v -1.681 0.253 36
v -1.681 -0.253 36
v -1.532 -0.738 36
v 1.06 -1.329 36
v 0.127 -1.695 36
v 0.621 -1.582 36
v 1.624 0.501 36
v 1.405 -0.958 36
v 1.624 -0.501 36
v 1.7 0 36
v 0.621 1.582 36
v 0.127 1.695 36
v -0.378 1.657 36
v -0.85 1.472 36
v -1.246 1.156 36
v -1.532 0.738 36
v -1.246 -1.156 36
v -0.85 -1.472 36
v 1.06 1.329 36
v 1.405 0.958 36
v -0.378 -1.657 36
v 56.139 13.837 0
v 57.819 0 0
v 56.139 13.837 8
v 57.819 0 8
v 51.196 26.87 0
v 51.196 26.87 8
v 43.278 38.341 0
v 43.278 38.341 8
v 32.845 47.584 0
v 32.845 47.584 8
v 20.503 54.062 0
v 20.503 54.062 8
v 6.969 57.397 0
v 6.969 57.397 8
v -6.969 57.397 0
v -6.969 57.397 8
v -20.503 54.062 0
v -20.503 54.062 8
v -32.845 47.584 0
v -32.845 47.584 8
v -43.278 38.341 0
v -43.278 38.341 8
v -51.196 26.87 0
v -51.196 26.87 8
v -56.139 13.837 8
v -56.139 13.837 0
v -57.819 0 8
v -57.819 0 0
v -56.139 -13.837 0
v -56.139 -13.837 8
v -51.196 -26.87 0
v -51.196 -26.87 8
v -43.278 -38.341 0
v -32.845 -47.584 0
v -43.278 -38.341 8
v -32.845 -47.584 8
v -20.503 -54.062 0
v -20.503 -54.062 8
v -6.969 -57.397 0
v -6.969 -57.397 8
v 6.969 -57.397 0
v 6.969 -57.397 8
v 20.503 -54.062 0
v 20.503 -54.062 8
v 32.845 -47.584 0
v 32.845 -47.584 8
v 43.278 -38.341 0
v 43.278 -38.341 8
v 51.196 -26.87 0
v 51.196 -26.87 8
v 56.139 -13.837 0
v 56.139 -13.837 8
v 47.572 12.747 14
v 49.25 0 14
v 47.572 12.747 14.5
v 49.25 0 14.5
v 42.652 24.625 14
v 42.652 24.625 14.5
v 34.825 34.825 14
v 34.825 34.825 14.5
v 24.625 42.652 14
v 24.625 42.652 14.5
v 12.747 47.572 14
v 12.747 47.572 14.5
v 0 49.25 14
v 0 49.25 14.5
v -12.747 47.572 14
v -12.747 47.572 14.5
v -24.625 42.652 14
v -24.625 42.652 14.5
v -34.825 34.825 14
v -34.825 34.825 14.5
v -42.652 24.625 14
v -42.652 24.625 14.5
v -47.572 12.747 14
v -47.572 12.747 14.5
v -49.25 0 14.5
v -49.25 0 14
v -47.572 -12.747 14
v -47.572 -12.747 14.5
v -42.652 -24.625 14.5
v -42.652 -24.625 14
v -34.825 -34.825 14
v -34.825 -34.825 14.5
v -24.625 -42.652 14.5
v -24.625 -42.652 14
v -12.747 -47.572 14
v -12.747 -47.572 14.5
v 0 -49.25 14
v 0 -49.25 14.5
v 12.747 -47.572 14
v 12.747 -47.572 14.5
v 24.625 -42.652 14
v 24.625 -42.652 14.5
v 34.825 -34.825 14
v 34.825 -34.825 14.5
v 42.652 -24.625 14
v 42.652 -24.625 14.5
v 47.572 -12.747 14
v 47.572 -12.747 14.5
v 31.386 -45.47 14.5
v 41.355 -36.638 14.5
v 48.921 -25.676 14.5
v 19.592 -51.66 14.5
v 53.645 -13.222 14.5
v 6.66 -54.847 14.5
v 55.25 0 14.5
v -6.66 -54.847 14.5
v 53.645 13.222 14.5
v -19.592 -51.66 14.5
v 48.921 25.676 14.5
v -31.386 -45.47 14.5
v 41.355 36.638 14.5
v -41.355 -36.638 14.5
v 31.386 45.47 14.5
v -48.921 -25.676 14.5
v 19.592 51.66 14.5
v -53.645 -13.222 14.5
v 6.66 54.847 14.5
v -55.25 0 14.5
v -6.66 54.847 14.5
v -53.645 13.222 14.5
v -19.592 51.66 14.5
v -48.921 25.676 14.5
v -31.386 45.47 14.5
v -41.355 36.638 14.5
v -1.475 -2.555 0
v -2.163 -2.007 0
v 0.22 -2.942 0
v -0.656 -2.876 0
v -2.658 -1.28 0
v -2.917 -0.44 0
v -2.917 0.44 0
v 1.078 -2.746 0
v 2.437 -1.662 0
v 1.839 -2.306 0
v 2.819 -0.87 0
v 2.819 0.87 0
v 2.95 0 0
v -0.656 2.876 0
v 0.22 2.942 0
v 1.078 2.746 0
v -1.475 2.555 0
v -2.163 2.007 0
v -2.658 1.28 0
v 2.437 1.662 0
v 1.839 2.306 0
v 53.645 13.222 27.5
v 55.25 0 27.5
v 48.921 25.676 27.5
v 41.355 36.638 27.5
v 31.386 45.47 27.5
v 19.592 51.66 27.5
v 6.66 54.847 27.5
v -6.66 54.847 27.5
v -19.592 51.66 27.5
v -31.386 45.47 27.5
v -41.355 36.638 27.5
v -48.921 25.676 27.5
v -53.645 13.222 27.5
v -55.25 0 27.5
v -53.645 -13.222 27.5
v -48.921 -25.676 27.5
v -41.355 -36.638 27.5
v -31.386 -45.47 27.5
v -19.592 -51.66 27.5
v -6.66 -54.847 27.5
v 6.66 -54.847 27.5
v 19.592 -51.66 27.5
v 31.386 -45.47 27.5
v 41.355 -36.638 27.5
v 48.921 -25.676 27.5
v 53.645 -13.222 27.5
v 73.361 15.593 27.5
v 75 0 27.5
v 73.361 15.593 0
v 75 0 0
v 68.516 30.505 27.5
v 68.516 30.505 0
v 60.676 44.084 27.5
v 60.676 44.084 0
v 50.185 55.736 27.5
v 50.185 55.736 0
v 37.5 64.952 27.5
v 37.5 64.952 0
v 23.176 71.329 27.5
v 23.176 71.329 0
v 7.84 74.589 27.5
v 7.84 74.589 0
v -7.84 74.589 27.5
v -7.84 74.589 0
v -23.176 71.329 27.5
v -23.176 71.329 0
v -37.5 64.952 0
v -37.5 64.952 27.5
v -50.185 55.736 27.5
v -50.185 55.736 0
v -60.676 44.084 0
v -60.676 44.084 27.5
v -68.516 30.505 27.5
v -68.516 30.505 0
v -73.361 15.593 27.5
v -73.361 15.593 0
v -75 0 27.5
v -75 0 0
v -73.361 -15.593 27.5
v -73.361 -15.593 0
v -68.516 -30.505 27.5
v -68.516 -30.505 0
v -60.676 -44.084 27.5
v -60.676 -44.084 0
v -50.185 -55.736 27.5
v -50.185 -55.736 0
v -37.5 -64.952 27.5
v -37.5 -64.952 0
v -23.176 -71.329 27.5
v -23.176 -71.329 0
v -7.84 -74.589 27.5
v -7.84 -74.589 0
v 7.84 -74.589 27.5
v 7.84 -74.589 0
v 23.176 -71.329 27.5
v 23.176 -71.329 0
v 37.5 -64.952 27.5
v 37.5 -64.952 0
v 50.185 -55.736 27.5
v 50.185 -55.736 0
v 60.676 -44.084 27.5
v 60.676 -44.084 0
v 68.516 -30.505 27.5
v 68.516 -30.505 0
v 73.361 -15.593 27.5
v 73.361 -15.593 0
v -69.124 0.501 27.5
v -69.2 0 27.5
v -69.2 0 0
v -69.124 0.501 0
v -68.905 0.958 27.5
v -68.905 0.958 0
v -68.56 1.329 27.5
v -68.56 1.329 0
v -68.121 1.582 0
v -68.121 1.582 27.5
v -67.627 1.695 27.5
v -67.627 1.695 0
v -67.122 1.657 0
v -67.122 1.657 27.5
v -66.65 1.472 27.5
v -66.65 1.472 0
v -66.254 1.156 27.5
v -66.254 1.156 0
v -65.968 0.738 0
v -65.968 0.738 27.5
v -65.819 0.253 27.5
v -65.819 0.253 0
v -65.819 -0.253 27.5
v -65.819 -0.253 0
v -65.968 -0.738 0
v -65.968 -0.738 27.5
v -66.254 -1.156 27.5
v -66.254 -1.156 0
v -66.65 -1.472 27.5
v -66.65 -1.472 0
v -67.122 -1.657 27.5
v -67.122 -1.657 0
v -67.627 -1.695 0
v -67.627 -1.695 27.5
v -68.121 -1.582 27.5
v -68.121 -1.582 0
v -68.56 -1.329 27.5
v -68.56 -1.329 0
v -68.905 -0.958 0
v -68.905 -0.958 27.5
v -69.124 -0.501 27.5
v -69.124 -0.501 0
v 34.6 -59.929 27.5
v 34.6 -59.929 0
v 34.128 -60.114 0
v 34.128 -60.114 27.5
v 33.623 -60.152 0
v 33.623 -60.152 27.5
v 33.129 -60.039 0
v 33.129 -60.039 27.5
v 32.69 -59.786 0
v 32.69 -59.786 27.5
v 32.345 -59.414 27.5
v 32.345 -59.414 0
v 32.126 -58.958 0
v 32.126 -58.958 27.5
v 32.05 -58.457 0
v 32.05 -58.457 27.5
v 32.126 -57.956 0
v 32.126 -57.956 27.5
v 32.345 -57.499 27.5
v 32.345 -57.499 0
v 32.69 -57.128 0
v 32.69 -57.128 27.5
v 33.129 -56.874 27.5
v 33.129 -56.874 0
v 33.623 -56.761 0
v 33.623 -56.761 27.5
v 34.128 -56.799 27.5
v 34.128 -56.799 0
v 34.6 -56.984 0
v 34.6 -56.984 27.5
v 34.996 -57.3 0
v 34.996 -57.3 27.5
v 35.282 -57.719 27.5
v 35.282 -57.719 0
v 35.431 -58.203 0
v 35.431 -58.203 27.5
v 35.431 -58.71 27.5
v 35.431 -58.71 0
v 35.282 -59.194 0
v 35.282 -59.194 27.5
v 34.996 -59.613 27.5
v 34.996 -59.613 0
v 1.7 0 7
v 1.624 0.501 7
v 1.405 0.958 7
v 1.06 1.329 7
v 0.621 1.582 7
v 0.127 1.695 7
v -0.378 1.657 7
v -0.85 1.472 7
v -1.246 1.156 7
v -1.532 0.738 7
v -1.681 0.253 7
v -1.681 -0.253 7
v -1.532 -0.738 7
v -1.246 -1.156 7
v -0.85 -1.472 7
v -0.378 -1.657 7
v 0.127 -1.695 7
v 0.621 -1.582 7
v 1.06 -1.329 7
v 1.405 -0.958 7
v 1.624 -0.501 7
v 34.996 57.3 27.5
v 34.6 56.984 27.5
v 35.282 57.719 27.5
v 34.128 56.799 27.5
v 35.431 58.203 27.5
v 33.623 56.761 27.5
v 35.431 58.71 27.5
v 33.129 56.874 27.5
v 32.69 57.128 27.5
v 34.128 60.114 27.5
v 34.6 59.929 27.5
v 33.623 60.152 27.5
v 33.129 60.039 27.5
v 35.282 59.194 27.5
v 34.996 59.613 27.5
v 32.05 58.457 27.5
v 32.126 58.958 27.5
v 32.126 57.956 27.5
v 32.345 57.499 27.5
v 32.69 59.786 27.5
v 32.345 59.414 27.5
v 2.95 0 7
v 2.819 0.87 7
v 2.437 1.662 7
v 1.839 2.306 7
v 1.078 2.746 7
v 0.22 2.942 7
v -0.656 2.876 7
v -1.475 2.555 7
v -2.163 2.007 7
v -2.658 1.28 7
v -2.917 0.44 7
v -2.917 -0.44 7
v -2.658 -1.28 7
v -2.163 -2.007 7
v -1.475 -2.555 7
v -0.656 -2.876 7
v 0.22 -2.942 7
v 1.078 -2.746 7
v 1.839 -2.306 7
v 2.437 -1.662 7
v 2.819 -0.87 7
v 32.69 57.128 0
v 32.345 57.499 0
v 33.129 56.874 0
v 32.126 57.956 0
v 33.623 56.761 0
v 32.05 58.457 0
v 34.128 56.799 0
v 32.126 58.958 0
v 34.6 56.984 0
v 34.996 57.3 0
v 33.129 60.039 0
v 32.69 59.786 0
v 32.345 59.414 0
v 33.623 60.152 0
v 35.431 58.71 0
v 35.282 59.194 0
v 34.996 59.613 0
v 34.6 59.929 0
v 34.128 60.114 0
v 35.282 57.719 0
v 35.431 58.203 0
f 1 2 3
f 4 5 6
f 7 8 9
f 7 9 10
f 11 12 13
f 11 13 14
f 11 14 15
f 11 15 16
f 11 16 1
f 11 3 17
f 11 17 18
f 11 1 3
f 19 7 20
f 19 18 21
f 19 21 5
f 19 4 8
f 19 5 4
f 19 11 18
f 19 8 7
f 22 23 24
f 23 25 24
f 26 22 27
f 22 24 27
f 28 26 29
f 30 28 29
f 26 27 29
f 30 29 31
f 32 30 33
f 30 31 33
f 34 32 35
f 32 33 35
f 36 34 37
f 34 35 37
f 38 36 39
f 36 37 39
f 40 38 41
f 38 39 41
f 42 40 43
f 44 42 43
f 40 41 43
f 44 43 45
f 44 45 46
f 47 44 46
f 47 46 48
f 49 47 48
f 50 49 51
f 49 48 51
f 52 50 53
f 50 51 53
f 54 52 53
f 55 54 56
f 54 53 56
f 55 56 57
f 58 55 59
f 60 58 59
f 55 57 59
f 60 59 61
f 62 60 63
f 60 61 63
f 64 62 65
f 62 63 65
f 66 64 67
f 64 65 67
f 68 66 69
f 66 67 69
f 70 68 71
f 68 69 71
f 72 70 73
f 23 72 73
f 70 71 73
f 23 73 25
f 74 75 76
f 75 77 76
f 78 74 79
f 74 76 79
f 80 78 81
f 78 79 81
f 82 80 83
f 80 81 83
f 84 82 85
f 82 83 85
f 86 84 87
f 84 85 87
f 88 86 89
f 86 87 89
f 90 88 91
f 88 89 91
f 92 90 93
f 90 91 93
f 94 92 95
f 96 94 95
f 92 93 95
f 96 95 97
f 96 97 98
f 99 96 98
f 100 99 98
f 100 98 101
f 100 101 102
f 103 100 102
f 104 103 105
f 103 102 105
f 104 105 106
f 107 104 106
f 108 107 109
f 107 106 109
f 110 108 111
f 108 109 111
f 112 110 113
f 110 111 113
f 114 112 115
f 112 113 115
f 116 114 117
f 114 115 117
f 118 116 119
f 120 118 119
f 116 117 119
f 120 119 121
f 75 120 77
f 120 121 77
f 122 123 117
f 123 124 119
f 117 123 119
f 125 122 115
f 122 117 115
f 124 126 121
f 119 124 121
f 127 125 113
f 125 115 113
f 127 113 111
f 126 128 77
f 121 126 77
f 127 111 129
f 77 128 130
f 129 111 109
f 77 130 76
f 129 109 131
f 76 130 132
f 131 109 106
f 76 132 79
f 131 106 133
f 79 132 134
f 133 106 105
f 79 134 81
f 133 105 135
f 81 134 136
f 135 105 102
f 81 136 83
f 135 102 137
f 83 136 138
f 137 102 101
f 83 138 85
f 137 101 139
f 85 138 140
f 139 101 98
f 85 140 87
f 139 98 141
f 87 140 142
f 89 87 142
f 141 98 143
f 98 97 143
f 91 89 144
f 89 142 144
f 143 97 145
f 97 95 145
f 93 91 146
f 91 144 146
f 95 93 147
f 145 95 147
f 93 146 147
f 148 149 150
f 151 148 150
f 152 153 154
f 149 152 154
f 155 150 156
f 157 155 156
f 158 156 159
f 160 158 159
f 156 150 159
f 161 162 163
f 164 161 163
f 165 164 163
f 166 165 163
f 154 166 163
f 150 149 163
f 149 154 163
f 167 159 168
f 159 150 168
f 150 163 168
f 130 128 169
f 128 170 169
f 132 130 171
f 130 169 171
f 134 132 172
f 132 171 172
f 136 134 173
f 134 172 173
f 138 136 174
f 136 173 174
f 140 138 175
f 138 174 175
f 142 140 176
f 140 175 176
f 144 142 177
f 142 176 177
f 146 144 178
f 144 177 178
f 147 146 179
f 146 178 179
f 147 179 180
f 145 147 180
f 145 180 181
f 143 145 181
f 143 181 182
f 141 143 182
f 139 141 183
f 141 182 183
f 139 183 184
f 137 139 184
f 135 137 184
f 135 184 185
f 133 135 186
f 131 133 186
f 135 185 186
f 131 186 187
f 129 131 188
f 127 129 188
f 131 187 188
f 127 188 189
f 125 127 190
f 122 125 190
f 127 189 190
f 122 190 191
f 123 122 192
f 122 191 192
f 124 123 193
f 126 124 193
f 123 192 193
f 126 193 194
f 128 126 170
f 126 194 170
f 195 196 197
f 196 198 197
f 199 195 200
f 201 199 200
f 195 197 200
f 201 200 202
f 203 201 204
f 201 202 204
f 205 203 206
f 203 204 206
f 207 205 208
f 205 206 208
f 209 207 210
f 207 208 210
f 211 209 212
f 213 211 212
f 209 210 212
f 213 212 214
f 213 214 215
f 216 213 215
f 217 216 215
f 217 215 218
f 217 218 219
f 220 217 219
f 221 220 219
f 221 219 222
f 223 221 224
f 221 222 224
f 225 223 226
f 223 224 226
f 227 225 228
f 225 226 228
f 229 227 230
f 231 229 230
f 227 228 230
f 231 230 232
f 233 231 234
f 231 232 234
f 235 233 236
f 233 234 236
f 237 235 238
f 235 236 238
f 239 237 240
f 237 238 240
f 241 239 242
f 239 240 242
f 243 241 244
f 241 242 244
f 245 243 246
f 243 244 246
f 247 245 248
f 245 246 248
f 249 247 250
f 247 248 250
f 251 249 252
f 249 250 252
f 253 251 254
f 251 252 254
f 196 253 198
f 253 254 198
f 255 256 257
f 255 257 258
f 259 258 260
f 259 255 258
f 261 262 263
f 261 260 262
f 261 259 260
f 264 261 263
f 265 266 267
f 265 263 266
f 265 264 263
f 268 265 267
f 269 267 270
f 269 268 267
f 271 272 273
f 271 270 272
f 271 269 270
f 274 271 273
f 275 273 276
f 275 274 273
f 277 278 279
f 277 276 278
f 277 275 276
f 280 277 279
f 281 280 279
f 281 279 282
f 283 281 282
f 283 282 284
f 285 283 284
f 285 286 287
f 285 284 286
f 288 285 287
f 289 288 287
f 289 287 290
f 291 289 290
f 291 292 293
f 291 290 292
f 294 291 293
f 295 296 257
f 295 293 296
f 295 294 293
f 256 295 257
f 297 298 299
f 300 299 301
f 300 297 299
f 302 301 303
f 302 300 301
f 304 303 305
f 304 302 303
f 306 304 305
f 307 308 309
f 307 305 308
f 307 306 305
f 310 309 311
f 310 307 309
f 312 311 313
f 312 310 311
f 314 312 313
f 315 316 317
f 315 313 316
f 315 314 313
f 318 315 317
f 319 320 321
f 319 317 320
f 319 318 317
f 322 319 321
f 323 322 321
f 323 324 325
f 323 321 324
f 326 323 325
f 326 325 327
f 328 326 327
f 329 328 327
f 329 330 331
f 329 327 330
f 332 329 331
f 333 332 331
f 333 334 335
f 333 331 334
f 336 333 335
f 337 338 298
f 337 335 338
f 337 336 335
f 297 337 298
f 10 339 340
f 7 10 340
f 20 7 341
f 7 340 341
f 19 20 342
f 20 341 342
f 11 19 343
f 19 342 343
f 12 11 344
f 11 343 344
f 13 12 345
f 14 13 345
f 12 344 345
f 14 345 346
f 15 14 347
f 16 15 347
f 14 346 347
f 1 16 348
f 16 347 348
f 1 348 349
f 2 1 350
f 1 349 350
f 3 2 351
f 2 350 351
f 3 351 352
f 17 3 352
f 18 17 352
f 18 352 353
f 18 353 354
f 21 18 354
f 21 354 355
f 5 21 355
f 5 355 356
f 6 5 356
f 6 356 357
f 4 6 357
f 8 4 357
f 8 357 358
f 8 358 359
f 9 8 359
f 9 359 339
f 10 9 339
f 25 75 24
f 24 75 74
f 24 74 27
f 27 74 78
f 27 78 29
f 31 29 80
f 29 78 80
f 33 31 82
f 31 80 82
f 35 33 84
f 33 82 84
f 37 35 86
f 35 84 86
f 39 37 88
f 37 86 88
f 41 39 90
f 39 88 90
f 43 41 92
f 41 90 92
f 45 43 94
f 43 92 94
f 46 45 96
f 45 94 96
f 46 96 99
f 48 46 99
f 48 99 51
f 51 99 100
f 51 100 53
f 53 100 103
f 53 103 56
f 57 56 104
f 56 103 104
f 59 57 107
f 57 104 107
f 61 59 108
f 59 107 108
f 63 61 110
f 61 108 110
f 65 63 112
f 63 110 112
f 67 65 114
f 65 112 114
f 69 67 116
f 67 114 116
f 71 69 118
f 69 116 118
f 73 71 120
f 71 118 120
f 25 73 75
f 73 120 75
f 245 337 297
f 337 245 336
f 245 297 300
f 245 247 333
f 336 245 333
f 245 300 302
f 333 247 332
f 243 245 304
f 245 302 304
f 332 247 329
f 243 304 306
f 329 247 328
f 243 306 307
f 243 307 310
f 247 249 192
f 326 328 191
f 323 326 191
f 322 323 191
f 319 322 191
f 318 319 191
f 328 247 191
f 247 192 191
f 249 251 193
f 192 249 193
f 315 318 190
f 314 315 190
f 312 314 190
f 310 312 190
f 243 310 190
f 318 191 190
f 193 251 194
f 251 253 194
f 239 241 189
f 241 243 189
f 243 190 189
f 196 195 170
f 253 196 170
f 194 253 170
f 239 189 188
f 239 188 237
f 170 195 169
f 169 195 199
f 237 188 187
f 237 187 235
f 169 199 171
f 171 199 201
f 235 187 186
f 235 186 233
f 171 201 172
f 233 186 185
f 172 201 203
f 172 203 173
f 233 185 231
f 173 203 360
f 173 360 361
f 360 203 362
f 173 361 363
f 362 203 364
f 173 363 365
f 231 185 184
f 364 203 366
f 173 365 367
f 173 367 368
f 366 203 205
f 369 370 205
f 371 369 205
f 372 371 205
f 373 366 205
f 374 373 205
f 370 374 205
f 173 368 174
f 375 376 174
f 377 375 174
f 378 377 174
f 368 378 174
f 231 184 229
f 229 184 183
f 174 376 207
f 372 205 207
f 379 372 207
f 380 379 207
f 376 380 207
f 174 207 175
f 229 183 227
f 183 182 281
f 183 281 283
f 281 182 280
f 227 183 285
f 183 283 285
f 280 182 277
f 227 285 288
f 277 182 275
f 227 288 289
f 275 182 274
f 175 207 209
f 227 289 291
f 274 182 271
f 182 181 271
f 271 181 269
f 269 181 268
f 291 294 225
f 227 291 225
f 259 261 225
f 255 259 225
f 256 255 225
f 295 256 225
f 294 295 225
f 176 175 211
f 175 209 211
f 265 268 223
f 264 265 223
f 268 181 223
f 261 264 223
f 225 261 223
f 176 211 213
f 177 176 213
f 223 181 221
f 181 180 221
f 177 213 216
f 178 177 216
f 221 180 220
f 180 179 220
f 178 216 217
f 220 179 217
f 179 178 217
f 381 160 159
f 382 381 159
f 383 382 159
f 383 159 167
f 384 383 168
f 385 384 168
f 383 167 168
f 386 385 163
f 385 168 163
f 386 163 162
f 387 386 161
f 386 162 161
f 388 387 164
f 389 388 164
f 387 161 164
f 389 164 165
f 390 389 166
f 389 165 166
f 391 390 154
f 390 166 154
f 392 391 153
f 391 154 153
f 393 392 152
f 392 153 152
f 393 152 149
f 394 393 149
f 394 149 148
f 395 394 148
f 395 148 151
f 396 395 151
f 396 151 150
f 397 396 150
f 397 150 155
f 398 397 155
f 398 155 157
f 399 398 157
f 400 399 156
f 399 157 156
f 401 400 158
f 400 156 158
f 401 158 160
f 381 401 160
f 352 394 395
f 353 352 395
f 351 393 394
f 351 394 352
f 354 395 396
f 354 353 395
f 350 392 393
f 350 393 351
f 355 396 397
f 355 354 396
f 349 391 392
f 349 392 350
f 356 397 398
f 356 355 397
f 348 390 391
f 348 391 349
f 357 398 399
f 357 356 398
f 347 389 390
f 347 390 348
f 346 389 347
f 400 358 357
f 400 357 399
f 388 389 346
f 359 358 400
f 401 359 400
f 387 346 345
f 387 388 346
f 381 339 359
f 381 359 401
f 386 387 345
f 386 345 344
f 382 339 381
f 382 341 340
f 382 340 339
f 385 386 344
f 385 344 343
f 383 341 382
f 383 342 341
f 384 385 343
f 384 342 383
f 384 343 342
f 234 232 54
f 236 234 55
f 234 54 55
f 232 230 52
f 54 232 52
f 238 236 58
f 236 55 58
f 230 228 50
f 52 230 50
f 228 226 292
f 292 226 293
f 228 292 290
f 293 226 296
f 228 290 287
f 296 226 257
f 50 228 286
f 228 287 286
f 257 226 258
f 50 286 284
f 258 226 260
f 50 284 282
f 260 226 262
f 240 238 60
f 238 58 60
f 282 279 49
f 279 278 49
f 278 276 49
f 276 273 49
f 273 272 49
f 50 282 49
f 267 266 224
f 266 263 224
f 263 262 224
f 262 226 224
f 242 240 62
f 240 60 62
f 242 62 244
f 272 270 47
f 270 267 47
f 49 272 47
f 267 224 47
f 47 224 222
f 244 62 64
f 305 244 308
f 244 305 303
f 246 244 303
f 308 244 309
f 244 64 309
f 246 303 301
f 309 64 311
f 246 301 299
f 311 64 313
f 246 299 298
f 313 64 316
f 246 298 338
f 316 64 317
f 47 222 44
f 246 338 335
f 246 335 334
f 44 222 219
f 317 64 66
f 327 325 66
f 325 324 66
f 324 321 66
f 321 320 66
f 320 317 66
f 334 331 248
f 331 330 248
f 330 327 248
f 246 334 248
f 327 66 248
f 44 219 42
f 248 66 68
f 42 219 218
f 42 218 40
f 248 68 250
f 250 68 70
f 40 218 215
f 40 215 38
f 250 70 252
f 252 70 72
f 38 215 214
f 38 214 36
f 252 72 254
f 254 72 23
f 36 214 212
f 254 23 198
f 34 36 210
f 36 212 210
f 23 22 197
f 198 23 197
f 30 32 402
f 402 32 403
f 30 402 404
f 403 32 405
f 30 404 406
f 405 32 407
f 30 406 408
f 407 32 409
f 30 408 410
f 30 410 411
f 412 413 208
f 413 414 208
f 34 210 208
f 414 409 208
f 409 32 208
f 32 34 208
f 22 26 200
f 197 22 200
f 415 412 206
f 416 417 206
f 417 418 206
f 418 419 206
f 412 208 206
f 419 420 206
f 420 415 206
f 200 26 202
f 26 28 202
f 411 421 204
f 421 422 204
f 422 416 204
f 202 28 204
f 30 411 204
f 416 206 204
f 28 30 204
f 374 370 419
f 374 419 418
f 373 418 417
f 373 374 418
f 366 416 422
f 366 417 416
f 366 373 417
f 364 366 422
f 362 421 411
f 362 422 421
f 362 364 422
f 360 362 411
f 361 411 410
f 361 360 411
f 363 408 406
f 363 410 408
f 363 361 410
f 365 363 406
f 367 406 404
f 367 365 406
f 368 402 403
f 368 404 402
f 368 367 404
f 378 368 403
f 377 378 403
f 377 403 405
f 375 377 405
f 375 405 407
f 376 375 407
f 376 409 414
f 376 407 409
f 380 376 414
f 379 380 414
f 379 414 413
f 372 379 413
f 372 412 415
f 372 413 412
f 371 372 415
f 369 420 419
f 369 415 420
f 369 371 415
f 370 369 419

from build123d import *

# Parameters (mm, degrees)
CYLINDER_R               = 2.95
CYLINDER_DEPTH           = 7
CYLINDER001_R            = 1.7
CYLINDER001_DEPTH        = 30
CLONE393_PLACEMENT_ANGLE = 180
ARRAY021_COUNT           = 3


with BuildPart() as m3bolthead:
    # Cylinder → Cylinder (new body)
    with BuildSketch(Plane.XY):
        Circle(CYLINDER_R)
    extrude(amount=CYLINDER_DEPTH)


with BuildPart() as m3bolt:
    # Cylinder001 → Cylinder001 (new body)
    with BuildSketch(Plane.XY.offset(6)):
        Circle(CYLINDER001_R)
    extrude(amount=CYLINDER001_DEPTH)

    # Fusion: union M3BoltHead
    add(m3bolthead.part)


with BuildPart() as array021:
    # Clone393 base: copy of M3Bolt
    add(m3bolt.part)


with BuildPart() as array021_1:
    # Clone393 placement: moved
    add(array021.part.moved(Location((-67.5, 0, 35))).rotate(Axis((-67.5, 0, 35), (0, 1, 0)), CLONE393_PLACEMENT_ANGLE))

    # Array021: Array021 ×3 about axis
    array021_axis = Axis((0, 0, 0), (0, 0, 1))


with BuildPart() as array021_2:
    add(array021_1.part)
    for i in range(1, ARRAY021_COUNT):
        add(array021_1.part.rotate(array021_axis, i * 360 / ARRAY021_COUNT))


with BuildPart() as basetop:
    # Sketch076 → Revolution021 (revolve)
    with BuildSketch(Plane.XZ):
        Polygon((57.818888, 0), (57.818888, 8), (49.25, 14), (49.25, 14.5), (55.25, 14.5), (55.25, 27.5), (75, 27.5), (75, 0), align=None)
    revolve(axis=Axis((0, 0, 0), (0, 0, 1)))

    # Cut128: cut Array021
    add(array021_2.part, mode=Mode.SUBTRACT)


solid = Compound([m3bolt.part, basetop.part])
